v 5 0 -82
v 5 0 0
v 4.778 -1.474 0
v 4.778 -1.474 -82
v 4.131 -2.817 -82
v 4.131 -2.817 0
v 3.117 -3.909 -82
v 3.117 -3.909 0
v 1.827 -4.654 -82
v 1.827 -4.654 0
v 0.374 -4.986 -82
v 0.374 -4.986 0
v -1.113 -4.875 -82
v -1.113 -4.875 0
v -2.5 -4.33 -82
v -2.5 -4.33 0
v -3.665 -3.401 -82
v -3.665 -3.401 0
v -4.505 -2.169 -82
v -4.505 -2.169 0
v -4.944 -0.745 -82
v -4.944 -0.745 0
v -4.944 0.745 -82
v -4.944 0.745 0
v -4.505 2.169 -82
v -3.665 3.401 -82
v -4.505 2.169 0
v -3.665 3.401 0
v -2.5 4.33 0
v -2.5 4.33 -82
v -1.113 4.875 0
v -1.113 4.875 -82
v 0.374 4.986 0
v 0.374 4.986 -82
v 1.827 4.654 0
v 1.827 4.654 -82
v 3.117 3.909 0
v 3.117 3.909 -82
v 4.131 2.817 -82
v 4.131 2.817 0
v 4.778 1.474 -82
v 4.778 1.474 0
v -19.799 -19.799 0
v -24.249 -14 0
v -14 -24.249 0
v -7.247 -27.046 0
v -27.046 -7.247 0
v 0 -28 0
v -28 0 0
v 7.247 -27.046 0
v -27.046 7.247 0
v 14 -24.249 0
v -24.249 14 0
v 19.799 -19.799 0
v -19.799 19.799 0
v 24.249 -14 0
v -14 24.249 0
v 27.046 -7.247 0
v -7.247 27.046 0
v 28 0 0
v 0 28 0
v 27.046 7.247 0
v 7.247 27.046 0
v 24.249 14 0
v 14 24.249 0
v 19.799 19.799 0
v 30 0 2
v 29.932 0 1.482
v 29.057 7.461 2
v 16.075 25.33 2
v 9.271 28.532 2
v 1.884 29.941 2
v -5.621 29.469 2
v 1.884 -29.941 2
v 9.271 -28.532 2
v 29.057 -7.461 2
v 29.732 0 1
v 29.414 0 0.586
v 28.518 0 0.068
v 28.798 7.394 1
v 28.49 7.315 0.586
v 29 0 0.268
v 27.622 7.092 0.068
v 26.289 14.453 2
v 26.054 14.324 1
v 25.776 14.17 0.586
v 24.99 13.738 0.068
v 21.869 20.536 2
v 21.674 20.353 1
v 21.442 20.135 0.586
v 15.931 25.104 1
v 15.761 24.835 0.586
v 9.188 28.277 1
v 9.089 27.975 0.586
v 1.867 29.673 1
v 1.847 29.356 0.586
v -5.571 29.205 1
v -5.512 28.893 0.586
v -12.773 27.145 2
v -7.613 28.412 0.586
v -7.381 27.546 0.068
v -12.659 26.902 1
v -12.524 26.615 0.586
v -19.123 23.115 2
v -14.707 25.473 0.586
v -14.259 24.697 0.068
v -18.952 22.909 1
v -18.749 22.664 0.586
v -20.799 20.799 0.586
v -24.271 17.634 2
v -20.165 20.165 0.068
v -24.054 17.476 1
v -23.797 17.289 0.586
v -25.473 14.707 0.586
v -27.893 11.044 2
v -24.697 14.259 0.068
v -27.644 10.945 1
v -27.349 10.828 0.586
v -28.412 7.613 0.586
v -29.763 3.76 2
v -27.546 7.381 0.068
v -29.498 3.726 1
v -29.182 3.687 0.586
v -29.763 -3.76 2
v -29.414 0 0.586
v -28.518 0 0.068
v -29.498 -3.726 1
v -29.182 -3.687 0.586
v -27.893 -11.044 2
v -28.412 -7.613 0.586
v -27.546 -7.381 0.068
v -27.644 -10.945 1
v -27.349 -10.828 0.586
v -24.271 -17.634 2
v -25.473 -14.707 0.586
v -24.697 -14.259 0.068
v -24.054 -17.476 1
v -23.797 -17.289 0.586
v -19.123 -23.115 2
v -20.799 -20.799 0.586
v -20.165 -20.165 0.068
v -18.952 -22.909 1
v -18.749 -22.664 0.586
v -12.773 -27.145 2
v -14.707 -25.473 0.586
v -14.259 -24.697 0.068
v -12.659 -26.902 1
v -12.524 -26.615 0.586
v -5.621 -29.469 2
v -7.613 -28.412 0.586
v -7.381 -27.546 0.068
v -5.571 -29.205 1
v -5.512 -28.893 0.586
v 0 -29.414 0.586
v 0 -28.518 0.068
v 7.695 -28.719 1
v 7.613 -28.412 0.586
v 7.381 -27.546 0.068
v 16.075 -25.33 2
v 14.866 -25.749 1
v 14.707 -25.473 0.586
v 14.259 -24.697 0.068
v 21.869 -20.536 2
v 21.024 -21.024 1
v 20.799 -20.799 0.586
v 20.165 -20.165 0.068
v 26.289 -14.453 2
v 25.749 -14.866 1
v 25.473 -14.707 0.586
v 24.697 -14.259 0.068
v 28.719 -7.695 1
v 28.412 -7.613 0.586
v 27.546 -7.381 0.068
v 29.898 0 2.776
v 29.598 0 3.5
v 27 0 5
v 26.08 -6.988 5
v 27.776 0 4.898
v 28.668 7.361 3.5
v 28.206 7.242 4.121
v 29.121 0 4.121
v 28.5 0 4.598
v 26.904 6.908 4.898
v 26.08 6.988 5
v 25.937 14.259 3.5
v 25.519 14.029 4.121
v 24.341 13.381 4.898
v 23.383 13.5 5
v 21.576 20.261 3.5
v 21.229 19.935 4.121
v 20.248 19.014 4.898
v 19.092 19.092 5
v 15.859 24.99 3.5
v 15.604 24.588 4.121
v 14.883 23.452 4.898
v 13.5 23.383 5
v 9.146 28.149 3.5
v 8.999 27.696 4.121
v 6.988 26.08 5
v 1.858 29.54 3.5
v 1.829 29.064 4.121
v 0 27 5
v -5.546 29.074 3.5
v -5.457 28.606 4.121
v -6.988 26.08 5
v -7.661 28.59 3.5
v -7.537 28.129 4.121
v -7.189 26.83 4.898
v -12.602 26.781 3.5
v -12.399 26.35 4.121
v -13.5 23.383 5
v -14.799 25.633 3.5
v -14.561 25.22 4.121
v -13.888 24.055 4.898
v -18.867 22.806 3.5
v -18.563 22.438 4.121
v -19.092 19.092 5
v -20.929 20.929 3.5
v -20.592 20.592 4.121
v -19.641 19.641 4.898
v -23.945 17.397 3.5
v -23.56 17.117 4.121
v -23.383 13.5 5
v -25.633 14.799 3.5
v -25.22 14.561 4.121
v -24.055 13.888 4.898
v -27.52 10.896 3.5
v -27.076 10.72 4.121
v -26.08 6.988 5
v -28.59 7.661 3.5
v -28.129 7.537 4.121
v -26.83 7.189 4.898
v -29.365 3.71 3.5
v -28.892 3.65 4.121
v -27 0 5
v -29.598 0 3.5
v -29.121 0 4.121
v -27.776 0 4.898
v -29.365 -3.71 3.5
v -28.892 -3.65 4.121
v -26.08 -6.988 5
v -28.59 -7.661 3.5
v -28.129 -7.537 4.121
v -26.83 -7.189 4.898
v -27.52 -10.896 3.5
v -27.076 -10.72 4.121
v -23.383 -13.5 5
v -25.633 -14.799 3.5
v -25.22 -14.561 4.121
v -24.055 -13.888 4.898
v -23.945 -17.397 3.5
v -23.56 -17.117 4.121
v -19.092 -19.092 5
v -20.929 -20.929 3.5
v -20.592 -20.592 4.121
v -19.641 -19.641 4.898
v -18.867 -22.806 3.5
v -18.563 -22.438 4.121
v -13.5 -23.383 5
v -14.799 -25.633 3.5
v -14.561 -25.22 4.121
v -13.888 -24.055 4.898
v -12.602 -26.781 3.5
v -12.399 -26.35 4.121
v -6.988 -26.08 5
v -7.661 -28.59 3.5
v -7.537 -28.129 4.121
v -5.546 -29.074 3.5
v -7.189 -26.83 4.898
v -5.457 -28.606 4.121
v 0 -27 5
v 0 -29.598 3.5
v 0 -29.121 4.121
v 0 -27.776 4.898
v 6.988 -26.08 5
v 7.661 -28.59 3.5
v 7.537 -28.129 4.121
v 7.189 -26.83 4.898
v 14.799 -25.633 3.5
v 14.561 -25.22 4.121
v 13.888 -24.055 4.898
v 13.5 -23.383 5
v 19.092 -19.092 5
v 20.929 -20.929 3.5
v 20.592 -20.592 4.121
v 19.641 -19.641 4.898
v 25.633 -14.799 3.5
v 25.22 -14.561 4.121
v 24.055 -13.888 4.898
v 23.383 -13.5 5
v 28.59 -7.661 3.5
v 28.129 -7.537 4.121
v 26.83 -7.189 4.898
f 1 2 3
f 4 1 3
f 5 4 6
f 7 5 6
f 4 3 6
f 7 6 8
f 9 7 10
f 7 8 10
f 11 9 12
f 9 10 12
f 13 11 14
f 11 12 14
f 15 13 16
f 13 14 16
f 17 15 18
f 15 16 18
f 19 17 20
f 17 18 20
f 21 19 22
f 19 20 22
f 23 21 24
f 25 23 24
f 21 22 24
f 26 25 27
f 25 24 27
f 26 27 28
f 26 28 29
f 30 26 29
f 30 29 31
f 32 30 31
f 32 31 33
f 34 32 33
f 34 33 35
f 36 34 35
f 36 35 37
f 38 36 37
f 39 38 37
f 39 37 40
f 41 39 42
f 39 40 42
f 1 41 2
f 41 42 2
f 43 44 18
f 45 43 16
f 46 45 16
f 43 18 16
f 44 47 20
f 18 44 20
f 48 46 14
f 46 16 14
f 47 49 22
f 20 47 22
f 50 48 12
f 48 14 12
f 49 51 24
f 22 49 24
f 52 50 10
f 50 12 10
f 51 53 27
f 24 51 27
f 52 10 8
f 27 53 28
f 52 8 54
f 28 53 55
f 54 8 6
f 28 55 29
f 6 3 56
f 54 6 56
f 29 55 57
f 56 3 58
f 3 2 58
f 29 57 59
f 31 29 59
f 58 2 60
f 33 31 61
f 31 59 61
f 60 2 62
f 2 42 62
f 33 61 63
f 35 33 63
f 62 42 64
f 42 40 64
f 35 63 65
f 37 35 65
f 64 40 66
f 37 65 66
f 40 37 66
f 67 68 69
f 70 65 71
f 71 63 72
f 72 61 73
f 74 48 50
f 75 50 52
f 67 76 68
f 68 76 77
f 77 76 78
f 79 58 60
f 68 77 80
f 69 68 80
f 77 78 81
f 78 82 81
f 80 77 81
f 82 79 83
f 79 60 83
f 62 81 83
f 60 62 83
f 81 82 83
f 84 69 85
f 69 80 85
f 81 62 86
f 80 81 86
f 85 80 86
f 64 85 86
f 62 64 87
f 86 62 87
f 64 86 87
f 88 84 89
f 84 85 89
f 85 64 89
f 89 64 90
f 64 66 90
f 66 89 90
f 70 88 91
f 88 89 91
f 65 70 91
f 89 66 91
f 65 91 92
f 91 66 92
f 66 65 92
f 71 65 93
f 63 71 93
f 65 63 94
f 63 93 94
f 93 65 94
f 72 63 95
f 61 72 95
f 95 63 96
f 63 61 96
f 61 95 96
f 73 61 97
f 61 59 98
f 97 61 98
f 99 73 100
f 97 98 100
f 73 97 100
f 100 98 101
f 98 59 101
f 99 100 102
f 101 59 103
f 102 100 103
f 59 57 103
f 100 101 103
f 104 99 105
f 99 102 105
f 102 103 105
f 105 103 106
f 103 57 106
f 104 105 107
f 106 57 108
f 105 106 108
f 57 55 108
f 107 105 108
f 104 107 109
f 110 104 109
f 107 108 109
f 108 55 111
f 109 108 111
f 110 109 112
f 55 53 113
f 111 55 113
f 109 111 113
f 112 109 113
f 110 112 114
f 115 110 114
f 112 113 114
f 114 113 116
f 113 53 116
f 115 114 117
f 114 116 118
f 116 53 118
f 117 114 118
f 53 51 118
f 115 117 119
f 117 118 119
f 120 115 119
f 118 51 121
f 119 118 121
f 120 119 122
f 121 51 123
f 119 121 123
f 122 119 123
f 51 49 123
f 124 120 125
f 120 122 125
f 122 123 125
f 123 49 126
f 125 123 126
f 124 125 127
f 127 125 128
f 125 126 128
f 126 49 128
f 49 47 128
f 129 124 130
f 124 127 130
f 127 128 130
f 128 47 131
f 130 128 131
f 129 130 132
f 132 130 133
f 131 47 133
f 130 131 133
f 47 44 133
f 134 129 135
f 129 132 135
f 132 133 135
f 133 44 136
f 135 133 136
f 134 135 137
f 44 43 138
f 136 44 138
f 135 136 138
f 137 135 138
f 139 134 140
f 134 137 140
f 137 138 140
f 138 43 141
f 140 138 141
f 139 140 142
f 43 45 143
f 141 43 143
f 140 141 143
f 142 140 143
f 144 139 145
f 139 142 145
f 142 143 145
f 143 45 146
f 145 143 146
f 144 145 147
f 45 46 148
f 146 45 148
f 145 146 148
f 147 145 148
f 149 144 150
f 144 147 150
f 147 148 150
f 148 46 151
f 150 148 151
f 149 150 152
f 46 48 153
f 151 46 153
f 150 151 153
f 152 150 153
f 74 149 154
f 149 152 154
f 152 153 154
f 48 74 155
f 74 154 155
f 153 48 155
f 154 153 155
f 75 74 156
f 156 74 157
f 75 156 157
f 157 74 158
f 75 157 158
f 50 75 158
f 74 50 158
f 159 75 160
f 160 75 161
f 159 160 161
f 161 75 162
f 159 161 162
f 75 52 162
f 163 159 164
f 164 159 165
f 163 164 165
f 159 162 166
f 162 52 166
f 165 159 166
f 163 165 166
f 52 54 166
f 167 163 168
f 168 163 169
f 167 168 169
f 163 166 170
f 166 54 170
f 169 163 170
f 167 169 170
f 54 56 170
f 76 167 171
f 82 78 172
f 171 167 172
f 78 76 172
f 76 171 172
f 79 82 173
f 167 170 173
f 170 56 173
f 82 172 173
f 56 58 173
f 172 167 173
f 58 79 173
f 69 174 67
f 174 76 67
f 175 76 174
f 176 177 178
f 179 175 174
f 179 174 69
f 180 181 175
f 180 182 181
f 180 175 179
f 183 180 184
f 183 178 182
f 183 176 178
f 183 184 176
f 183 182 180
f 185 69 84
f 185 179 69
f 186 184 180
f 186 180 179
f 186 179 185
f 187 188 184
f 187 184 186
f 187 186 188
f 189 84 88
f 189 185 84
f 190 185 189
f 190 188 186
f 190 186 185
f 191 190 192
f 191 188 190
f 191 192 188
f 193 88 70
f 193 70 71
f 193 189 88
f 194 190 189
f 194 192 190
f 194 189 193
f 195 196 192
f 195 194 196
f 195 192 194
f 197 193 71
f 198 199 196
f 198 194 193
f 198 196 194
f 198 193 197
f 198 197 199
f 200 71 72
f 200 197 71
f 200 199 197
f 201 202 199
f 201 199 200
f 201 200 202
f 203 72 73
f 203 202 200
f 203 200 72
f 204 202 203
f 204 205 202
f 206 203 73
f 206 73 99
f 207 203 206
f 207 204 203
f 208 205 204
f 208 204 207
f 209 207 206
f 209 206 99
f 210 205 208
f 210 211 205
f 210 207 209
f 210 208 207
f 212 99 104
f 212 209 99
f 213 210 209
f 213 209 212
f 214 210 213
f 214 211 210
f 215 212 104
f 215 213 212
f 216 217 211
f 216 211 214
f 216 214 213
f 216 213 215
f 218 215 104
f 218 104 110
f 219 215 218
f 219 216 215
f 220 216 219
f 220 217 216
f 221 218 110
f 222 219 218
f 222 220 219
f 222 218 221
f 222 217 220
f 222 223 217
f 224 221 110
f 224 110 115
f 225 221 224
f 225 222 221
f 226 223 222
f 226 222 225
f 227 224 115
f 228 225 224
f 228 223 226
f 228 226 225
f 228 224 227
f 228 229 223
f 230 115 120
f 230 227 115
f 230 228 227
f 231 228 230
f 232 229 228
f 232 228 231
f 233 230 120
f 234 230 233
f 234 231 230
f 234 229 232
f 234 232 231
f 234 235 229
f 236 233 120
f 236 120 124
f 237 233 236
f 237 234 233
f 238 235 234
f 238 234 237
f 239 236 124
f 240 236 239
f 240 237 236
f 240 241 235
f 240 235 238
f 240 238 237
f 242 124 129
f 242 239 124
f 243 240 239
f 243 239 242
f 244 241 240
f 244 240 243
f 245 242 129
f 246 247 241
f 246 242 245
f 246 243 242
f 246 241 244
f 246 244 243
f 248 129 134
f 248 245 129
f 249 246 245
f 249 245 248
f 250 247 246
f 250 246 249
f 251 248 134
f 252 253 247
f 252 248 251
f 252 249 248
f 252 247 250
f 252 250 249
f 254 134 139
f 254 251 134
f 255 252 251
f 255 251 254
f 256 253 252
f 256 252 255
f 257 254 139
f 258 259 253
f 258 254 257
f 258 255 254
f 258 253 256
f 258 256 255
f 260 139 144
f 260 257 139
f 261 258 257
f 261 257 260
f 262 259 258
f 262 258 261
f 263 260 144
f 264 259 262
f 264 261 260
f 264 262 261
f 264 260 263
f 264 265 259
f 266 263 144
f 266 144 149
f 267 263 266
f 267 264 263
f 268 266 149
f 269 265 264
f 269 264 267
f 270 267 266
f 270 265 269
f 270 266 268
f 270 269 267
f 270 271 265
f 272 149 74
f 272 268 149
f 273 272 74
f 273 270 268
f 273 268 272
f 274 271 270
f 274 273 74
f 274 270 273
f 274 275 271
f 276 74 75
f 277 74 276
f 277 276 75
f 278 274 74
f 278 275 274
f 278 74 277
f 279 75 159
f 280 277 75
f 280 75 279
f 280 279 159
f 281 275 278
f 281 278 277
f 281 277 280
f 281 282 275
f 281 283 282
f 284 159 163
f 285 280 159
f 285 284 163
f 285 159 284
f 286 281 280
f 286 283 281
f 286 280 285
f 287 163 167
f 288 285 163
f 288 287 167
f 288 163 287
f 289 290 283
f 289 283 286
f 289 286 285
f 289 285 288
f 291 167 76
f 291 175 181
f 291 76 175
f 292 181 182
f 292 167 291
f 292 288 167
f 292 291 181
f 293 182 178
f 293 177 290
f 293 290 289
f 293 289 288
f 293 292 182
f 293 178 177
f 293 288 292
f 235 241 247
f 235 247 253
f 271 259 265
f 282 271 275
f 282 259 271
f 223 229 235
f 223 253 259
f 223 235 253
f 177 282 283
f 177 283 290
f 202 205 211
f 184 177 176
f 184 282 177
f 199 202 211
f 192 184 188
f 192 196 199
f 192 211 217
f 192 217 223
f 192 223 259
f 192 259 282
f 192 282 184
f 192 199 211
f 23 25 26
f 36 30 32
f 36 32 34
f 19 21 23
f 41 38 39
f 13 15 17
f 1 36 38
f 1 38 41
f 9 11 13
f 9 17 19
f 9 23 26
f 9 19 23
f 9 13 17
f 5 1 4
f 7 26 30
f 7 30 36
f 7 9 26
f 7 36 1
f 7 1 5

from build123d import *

# Parameters (mm, degrees)
F0_R     = 30
F1_DEPTH = 5
F2_R     = 3
F3_R     = 1.99999
F4_R     = 5
F5_DEPTH = 82


# Not quite as in the source:
# - a fillet or chamfer is up to 0.001 mm smaller than in the source, because OpenCascade refuses the exact size


with BuildPart() as f1:
    # F0 (on Top) → F1 (new body)
    with BuildSketch(Plane.XY):
        Circle(F0_R)
    extrude(amount=F1_DEPTH)

    # F2
    f2_edges = [f1.edges().sort_by_distance(p)[0] for p in [
        (-30, 0, 5),
    ]]
    fillet(f2_edges, radius=F2_R)

    # F3 (radius 2 in the source; OpenCascade refuses exactly that, so slightly less here)
    f3_edges = [f1.edges().sort_by_distance(p)[0] for p in [
        (-30, 0, 0),
    ]]
    fillet(f3_edges, radius=F3_R)

    # F4 (on face) → F5 (join)
    with BuildSketch(Plane(origin=(0, 0, 0), x_dir=(1, 0, 0), z_dir=(0, 0, -1))):
        Circle(F4_R)
    extrude(amount=F5_DEPTH)


solid = f1.part
